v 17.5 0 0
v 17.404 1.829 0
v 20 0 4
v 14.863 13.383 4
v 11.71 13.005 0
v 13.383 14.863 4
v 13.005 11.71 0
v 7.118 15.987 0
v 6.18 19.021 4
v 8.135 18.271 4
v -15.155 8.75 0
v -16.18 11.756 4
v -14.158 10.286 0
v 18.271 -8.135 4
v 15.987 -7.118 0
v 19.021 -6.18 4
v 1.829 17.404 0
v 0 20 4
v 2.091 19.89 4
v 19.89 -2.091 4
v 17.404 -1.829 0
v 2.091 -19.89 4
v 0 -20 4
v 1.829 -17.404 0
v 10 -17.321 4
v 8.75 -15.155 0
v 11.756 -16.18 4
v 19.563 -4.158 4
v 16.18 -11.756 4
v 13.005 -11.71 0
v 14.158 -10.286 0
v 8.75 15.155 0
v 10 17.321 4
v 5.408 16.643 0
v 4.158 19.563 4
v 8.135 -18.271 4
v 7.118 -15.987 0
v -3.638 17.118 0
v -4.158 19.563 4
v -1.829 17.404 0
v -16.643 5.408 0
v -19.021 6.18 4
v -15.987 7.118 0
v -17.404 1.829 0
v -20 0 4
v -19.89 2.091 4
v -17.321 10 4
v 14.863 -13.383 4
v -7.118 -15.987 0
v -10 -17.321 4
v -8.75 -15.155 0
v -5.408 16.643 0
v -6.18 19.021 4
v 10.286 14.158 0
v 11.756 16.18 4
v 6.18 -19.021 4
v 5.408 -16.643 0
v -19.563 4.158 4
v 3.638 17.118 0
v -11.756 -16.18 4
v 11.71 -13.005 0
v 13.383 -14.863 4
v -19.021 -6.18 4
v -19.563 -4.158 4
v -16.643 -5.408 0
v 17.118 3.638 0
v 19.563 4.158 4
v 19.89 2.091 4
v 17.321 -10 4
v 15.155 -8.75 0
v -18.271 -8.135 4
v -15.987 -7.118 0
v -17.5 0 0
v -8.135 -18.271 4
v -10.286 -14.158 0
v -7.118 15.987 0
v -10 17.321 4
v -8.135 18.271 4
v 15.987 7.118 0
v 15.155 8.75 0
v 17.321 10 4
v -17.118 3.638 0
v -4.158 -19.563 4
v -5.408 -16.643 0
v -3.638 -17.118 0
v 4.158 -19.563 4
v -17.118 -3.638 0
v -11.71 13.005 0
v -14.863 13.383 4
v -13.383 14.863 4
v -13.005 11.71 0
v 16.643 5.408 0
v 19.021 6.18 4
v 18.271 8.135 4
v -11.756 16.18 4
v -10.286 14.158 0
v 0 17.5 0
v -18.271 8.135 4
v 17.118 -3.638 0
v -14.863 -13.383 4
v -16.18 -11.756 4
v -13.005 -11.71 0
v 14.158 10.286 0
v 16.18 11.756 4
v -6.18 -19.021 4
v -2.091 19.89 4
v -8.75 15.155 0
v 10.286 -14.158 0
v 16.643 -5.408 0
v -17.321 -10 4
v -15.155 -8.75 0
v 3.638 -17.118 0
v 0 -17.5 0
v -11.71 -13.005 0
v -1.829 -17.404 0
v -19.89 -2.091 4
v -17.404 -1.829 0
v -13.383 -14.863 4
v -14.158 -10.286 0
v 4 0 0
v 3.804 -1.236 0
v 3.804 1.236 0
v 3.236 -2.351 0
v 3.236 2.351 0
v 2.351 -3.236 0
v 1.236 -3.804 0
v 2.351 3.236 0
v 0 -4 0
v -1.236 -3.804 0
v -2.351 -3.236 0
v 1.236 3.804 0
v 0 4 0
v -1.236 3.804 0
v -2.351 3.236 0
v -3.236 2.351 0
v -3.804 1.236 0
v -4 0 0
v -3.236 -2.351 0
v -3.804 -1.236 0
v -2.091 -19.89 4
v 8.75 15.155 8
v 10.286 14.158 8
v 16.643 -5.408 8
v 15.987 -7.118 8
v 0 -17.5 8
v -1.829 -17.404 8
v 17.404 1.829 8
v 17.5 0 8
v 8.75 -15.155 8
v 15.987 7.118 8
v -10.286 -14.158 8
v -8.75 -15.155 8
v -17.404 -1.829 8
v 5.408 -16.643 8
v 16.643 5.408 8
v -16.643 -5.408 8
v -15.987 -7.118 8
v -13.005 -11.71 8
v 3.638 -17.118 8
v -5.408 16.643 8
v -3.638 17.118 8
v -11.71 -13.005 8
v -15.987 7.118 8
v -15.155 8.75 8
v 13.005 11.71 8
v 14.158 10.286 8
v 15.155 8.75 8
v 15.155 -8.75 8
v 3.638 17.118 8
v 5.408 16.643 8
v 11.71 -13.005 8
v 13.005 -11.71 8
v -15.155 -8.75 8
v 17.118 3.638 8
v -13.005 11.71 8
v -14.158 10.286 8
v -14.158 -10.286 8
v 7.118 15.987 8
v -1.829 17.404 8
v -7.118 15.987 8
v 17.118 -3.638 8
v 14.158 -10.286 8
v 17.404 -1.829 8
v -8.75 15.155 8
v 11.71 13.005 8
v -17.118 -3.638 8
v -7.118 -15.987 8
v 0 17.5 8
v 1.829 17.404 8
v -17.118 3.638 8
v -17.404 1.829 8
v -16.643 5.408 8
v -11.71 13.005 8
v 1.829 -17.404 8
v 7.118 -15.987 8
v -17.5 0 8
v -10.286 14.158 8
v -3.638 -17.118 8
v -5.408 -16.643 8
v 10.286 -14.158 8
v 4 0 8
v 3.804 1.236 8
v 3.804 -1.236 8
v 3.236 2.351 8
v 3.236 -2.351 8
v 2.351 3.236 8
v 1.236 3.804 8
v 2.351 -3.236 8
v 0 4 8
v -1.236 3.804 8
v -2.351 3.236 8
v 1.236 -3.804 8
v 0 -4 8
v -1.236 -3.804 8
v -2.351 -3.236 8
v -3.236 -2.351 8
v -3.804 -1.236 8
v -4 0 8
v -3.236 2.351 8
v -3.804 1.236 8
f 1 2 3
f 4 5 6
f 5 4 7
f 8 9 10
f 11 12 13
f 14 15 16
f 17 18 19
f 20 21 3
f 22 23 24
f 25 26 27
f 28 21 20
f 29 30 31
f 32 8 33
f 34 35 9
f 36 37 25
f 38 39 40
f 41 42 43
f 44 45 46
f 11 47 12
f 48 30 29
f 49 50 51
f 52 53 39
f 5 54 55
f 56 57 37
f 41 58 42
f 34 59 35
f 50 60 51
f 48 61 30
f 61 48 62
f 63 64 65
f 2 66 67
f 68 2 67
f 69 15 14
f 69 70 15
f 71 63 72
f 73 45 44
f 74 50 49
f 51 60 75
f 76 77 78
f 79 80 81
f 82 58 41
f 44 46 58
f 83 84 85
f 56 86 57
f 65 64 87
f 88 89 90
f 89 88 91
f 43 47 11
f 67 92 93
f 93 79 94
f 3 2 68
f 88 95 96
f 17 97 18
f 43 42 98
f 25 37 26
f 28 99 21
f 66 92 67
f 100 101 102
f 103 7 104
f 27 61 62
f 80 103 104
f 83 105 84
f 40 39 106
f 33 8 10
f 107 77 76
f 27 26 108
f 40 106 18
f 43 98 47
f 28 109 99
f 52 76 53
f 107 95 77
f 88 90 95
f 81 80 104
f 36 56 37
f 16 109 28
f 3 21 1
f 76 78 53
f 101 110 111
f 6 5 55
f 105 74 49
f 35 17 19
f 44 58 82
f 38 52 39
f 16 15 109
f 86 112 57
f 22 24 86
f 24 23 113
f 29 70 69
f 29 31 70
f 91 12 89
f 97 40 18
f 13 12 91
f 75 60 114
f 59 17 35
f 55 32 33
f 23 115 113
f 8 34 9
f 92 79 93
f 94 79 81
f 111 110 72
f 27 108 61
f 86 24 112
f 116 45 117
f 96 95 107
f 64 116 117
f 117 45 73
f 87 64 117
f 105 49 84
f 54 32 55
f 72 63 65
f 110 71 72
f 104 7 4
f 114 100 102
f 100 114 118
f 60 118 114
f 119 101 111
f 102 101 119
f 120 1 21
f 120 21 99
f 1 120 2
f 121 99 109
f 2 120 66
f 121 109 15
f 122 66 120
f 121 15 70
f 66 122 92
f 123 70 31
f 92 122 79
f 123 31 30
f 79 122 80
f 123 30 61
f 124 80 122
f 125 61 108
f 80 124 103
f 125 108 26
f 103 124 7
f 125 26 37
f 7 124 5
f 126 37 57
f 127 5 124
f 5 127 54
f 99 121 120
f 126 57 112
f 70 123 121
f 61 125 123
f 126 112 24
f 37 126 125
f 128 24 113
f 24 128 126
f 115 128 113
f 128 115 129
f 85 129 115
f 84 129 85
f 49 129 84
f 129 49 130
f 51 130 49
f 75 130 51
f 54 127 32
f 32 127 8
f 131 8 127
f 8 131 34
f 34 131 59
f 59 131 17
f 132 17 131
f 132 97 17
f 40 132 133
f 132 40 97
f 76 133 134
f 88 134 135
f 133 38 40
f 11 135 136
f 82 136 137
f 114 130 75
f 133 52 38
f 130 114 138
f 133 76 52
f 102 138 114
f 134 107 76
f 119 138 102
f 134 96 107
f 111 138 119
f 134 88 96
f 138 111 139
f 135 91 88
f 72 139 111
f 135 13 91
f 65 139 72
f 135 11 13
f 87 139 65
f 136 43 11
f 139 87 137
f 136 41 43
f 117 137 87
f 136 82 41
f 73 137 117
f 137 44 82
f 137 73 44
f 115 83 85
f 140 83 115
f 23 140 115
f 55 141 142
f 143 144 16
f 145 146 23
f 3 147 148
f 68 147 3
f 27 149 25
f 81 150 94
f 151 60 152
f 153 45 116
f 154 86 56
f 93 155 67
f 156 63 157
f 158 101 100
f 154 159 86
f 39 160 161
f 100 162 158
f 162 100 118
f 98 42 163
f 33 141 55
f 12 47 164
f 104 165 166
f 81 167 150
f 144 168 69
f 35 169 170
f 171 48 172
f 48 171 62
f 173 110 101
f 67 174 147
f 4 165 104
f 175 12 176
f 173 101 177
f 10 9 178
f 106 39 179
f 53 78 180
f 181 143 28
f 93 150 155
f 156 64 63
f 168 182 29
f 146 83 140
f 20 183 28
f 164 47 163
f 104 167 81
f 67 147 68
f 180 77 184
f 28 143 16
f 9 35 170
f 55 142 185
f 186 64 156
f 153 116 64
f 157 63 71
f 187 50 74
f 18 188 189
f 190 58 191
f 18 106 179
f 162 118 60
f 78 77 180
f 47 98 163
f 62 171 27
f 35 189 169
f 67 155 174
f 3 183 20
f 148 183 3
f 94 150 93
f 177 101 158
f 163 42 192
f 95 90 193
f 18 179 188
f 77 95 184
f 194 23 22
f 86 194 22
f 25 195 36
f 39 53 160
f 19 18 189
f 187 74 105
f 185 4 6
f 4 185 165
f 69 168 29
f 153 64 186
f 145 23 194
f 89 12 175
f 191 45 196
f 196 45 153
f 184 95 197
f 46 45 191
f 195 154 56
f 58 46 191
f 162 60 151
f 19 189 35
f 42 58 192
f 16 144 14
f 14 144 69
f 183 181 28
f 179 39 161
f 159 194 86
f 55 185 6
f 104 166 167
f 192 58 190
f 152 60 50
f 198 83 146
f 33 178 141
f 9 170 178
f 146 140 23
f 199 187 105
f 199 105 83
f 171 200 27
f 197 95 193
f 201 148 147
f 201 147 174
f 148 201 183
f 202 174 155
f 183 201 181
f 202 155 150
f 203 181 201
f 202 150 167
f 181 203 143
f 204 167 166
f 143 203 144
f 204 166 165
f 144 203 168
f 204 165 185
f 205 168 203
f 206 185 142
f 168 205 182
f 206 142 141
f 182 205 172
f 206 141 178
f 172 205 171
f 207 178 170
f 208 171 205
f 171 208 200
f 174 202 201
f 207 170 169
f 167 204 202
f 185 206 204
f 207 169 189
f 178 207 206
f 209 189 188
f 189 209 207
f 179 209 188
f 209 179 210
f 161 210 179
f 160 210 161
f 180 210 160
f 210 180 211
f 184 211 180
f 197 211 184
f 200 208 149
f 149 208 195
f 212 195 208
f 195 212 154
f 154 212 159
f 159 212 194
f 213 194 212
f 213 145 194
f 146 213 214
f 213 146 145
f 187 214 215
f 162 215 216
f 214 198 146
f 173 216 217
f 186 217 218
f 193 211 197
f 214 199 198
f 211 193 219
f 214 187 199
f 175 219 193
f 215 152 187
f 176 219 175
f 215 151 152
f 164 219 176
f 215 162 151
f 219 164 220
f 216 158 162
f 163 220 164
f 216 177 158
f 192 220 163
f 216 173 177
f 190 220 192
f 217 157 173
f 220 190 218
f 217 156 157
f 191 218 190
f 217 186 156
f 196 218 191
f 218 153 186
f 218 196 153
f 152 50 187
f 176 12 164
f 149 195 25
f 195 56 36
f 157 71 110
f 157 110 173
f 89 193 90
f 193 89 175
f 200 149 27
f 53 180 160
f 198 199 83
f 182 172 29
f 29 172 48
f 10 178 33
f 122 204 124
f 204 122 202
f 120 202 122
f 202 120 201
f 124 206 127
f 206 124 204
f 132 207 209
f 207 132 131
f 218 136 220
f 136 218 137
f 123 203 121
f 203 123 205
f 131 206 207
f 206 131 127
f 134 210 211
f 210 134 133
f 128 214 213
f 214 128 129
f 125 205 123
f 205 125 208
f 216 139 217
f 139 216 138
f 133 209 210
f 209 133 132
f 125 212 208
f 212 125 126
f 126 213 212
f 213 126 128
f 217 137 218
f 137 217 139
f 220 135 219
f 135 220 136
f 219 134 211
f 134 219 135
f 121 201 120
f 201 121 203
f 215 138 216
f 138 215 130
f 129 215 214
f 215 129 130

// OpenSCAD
/* [Global] */

//Thickness of the roller
thickness = 8; //[1:100]

//Larger diameter of the wheel
large_dia=40;

//Smaller diameter of the wheel
small_dia=35;

//Mounting bolt diameter
bolt_size=8;

difference()
{
	union()
	{
		cylinder(h=thickness/2, r1=small_dia/2, r2=large_dia/2, center=false, $fn=60);
		translate([0,0,thickness/2]) cylinder(h=thickness/2, r1=large_dia/2, r2=small_dia/2, center=false, $fn=60);
	}
	union()
	{
		cylinder(h=thickness, r=bolt_size/2, $fn=20);
	}
}
	
